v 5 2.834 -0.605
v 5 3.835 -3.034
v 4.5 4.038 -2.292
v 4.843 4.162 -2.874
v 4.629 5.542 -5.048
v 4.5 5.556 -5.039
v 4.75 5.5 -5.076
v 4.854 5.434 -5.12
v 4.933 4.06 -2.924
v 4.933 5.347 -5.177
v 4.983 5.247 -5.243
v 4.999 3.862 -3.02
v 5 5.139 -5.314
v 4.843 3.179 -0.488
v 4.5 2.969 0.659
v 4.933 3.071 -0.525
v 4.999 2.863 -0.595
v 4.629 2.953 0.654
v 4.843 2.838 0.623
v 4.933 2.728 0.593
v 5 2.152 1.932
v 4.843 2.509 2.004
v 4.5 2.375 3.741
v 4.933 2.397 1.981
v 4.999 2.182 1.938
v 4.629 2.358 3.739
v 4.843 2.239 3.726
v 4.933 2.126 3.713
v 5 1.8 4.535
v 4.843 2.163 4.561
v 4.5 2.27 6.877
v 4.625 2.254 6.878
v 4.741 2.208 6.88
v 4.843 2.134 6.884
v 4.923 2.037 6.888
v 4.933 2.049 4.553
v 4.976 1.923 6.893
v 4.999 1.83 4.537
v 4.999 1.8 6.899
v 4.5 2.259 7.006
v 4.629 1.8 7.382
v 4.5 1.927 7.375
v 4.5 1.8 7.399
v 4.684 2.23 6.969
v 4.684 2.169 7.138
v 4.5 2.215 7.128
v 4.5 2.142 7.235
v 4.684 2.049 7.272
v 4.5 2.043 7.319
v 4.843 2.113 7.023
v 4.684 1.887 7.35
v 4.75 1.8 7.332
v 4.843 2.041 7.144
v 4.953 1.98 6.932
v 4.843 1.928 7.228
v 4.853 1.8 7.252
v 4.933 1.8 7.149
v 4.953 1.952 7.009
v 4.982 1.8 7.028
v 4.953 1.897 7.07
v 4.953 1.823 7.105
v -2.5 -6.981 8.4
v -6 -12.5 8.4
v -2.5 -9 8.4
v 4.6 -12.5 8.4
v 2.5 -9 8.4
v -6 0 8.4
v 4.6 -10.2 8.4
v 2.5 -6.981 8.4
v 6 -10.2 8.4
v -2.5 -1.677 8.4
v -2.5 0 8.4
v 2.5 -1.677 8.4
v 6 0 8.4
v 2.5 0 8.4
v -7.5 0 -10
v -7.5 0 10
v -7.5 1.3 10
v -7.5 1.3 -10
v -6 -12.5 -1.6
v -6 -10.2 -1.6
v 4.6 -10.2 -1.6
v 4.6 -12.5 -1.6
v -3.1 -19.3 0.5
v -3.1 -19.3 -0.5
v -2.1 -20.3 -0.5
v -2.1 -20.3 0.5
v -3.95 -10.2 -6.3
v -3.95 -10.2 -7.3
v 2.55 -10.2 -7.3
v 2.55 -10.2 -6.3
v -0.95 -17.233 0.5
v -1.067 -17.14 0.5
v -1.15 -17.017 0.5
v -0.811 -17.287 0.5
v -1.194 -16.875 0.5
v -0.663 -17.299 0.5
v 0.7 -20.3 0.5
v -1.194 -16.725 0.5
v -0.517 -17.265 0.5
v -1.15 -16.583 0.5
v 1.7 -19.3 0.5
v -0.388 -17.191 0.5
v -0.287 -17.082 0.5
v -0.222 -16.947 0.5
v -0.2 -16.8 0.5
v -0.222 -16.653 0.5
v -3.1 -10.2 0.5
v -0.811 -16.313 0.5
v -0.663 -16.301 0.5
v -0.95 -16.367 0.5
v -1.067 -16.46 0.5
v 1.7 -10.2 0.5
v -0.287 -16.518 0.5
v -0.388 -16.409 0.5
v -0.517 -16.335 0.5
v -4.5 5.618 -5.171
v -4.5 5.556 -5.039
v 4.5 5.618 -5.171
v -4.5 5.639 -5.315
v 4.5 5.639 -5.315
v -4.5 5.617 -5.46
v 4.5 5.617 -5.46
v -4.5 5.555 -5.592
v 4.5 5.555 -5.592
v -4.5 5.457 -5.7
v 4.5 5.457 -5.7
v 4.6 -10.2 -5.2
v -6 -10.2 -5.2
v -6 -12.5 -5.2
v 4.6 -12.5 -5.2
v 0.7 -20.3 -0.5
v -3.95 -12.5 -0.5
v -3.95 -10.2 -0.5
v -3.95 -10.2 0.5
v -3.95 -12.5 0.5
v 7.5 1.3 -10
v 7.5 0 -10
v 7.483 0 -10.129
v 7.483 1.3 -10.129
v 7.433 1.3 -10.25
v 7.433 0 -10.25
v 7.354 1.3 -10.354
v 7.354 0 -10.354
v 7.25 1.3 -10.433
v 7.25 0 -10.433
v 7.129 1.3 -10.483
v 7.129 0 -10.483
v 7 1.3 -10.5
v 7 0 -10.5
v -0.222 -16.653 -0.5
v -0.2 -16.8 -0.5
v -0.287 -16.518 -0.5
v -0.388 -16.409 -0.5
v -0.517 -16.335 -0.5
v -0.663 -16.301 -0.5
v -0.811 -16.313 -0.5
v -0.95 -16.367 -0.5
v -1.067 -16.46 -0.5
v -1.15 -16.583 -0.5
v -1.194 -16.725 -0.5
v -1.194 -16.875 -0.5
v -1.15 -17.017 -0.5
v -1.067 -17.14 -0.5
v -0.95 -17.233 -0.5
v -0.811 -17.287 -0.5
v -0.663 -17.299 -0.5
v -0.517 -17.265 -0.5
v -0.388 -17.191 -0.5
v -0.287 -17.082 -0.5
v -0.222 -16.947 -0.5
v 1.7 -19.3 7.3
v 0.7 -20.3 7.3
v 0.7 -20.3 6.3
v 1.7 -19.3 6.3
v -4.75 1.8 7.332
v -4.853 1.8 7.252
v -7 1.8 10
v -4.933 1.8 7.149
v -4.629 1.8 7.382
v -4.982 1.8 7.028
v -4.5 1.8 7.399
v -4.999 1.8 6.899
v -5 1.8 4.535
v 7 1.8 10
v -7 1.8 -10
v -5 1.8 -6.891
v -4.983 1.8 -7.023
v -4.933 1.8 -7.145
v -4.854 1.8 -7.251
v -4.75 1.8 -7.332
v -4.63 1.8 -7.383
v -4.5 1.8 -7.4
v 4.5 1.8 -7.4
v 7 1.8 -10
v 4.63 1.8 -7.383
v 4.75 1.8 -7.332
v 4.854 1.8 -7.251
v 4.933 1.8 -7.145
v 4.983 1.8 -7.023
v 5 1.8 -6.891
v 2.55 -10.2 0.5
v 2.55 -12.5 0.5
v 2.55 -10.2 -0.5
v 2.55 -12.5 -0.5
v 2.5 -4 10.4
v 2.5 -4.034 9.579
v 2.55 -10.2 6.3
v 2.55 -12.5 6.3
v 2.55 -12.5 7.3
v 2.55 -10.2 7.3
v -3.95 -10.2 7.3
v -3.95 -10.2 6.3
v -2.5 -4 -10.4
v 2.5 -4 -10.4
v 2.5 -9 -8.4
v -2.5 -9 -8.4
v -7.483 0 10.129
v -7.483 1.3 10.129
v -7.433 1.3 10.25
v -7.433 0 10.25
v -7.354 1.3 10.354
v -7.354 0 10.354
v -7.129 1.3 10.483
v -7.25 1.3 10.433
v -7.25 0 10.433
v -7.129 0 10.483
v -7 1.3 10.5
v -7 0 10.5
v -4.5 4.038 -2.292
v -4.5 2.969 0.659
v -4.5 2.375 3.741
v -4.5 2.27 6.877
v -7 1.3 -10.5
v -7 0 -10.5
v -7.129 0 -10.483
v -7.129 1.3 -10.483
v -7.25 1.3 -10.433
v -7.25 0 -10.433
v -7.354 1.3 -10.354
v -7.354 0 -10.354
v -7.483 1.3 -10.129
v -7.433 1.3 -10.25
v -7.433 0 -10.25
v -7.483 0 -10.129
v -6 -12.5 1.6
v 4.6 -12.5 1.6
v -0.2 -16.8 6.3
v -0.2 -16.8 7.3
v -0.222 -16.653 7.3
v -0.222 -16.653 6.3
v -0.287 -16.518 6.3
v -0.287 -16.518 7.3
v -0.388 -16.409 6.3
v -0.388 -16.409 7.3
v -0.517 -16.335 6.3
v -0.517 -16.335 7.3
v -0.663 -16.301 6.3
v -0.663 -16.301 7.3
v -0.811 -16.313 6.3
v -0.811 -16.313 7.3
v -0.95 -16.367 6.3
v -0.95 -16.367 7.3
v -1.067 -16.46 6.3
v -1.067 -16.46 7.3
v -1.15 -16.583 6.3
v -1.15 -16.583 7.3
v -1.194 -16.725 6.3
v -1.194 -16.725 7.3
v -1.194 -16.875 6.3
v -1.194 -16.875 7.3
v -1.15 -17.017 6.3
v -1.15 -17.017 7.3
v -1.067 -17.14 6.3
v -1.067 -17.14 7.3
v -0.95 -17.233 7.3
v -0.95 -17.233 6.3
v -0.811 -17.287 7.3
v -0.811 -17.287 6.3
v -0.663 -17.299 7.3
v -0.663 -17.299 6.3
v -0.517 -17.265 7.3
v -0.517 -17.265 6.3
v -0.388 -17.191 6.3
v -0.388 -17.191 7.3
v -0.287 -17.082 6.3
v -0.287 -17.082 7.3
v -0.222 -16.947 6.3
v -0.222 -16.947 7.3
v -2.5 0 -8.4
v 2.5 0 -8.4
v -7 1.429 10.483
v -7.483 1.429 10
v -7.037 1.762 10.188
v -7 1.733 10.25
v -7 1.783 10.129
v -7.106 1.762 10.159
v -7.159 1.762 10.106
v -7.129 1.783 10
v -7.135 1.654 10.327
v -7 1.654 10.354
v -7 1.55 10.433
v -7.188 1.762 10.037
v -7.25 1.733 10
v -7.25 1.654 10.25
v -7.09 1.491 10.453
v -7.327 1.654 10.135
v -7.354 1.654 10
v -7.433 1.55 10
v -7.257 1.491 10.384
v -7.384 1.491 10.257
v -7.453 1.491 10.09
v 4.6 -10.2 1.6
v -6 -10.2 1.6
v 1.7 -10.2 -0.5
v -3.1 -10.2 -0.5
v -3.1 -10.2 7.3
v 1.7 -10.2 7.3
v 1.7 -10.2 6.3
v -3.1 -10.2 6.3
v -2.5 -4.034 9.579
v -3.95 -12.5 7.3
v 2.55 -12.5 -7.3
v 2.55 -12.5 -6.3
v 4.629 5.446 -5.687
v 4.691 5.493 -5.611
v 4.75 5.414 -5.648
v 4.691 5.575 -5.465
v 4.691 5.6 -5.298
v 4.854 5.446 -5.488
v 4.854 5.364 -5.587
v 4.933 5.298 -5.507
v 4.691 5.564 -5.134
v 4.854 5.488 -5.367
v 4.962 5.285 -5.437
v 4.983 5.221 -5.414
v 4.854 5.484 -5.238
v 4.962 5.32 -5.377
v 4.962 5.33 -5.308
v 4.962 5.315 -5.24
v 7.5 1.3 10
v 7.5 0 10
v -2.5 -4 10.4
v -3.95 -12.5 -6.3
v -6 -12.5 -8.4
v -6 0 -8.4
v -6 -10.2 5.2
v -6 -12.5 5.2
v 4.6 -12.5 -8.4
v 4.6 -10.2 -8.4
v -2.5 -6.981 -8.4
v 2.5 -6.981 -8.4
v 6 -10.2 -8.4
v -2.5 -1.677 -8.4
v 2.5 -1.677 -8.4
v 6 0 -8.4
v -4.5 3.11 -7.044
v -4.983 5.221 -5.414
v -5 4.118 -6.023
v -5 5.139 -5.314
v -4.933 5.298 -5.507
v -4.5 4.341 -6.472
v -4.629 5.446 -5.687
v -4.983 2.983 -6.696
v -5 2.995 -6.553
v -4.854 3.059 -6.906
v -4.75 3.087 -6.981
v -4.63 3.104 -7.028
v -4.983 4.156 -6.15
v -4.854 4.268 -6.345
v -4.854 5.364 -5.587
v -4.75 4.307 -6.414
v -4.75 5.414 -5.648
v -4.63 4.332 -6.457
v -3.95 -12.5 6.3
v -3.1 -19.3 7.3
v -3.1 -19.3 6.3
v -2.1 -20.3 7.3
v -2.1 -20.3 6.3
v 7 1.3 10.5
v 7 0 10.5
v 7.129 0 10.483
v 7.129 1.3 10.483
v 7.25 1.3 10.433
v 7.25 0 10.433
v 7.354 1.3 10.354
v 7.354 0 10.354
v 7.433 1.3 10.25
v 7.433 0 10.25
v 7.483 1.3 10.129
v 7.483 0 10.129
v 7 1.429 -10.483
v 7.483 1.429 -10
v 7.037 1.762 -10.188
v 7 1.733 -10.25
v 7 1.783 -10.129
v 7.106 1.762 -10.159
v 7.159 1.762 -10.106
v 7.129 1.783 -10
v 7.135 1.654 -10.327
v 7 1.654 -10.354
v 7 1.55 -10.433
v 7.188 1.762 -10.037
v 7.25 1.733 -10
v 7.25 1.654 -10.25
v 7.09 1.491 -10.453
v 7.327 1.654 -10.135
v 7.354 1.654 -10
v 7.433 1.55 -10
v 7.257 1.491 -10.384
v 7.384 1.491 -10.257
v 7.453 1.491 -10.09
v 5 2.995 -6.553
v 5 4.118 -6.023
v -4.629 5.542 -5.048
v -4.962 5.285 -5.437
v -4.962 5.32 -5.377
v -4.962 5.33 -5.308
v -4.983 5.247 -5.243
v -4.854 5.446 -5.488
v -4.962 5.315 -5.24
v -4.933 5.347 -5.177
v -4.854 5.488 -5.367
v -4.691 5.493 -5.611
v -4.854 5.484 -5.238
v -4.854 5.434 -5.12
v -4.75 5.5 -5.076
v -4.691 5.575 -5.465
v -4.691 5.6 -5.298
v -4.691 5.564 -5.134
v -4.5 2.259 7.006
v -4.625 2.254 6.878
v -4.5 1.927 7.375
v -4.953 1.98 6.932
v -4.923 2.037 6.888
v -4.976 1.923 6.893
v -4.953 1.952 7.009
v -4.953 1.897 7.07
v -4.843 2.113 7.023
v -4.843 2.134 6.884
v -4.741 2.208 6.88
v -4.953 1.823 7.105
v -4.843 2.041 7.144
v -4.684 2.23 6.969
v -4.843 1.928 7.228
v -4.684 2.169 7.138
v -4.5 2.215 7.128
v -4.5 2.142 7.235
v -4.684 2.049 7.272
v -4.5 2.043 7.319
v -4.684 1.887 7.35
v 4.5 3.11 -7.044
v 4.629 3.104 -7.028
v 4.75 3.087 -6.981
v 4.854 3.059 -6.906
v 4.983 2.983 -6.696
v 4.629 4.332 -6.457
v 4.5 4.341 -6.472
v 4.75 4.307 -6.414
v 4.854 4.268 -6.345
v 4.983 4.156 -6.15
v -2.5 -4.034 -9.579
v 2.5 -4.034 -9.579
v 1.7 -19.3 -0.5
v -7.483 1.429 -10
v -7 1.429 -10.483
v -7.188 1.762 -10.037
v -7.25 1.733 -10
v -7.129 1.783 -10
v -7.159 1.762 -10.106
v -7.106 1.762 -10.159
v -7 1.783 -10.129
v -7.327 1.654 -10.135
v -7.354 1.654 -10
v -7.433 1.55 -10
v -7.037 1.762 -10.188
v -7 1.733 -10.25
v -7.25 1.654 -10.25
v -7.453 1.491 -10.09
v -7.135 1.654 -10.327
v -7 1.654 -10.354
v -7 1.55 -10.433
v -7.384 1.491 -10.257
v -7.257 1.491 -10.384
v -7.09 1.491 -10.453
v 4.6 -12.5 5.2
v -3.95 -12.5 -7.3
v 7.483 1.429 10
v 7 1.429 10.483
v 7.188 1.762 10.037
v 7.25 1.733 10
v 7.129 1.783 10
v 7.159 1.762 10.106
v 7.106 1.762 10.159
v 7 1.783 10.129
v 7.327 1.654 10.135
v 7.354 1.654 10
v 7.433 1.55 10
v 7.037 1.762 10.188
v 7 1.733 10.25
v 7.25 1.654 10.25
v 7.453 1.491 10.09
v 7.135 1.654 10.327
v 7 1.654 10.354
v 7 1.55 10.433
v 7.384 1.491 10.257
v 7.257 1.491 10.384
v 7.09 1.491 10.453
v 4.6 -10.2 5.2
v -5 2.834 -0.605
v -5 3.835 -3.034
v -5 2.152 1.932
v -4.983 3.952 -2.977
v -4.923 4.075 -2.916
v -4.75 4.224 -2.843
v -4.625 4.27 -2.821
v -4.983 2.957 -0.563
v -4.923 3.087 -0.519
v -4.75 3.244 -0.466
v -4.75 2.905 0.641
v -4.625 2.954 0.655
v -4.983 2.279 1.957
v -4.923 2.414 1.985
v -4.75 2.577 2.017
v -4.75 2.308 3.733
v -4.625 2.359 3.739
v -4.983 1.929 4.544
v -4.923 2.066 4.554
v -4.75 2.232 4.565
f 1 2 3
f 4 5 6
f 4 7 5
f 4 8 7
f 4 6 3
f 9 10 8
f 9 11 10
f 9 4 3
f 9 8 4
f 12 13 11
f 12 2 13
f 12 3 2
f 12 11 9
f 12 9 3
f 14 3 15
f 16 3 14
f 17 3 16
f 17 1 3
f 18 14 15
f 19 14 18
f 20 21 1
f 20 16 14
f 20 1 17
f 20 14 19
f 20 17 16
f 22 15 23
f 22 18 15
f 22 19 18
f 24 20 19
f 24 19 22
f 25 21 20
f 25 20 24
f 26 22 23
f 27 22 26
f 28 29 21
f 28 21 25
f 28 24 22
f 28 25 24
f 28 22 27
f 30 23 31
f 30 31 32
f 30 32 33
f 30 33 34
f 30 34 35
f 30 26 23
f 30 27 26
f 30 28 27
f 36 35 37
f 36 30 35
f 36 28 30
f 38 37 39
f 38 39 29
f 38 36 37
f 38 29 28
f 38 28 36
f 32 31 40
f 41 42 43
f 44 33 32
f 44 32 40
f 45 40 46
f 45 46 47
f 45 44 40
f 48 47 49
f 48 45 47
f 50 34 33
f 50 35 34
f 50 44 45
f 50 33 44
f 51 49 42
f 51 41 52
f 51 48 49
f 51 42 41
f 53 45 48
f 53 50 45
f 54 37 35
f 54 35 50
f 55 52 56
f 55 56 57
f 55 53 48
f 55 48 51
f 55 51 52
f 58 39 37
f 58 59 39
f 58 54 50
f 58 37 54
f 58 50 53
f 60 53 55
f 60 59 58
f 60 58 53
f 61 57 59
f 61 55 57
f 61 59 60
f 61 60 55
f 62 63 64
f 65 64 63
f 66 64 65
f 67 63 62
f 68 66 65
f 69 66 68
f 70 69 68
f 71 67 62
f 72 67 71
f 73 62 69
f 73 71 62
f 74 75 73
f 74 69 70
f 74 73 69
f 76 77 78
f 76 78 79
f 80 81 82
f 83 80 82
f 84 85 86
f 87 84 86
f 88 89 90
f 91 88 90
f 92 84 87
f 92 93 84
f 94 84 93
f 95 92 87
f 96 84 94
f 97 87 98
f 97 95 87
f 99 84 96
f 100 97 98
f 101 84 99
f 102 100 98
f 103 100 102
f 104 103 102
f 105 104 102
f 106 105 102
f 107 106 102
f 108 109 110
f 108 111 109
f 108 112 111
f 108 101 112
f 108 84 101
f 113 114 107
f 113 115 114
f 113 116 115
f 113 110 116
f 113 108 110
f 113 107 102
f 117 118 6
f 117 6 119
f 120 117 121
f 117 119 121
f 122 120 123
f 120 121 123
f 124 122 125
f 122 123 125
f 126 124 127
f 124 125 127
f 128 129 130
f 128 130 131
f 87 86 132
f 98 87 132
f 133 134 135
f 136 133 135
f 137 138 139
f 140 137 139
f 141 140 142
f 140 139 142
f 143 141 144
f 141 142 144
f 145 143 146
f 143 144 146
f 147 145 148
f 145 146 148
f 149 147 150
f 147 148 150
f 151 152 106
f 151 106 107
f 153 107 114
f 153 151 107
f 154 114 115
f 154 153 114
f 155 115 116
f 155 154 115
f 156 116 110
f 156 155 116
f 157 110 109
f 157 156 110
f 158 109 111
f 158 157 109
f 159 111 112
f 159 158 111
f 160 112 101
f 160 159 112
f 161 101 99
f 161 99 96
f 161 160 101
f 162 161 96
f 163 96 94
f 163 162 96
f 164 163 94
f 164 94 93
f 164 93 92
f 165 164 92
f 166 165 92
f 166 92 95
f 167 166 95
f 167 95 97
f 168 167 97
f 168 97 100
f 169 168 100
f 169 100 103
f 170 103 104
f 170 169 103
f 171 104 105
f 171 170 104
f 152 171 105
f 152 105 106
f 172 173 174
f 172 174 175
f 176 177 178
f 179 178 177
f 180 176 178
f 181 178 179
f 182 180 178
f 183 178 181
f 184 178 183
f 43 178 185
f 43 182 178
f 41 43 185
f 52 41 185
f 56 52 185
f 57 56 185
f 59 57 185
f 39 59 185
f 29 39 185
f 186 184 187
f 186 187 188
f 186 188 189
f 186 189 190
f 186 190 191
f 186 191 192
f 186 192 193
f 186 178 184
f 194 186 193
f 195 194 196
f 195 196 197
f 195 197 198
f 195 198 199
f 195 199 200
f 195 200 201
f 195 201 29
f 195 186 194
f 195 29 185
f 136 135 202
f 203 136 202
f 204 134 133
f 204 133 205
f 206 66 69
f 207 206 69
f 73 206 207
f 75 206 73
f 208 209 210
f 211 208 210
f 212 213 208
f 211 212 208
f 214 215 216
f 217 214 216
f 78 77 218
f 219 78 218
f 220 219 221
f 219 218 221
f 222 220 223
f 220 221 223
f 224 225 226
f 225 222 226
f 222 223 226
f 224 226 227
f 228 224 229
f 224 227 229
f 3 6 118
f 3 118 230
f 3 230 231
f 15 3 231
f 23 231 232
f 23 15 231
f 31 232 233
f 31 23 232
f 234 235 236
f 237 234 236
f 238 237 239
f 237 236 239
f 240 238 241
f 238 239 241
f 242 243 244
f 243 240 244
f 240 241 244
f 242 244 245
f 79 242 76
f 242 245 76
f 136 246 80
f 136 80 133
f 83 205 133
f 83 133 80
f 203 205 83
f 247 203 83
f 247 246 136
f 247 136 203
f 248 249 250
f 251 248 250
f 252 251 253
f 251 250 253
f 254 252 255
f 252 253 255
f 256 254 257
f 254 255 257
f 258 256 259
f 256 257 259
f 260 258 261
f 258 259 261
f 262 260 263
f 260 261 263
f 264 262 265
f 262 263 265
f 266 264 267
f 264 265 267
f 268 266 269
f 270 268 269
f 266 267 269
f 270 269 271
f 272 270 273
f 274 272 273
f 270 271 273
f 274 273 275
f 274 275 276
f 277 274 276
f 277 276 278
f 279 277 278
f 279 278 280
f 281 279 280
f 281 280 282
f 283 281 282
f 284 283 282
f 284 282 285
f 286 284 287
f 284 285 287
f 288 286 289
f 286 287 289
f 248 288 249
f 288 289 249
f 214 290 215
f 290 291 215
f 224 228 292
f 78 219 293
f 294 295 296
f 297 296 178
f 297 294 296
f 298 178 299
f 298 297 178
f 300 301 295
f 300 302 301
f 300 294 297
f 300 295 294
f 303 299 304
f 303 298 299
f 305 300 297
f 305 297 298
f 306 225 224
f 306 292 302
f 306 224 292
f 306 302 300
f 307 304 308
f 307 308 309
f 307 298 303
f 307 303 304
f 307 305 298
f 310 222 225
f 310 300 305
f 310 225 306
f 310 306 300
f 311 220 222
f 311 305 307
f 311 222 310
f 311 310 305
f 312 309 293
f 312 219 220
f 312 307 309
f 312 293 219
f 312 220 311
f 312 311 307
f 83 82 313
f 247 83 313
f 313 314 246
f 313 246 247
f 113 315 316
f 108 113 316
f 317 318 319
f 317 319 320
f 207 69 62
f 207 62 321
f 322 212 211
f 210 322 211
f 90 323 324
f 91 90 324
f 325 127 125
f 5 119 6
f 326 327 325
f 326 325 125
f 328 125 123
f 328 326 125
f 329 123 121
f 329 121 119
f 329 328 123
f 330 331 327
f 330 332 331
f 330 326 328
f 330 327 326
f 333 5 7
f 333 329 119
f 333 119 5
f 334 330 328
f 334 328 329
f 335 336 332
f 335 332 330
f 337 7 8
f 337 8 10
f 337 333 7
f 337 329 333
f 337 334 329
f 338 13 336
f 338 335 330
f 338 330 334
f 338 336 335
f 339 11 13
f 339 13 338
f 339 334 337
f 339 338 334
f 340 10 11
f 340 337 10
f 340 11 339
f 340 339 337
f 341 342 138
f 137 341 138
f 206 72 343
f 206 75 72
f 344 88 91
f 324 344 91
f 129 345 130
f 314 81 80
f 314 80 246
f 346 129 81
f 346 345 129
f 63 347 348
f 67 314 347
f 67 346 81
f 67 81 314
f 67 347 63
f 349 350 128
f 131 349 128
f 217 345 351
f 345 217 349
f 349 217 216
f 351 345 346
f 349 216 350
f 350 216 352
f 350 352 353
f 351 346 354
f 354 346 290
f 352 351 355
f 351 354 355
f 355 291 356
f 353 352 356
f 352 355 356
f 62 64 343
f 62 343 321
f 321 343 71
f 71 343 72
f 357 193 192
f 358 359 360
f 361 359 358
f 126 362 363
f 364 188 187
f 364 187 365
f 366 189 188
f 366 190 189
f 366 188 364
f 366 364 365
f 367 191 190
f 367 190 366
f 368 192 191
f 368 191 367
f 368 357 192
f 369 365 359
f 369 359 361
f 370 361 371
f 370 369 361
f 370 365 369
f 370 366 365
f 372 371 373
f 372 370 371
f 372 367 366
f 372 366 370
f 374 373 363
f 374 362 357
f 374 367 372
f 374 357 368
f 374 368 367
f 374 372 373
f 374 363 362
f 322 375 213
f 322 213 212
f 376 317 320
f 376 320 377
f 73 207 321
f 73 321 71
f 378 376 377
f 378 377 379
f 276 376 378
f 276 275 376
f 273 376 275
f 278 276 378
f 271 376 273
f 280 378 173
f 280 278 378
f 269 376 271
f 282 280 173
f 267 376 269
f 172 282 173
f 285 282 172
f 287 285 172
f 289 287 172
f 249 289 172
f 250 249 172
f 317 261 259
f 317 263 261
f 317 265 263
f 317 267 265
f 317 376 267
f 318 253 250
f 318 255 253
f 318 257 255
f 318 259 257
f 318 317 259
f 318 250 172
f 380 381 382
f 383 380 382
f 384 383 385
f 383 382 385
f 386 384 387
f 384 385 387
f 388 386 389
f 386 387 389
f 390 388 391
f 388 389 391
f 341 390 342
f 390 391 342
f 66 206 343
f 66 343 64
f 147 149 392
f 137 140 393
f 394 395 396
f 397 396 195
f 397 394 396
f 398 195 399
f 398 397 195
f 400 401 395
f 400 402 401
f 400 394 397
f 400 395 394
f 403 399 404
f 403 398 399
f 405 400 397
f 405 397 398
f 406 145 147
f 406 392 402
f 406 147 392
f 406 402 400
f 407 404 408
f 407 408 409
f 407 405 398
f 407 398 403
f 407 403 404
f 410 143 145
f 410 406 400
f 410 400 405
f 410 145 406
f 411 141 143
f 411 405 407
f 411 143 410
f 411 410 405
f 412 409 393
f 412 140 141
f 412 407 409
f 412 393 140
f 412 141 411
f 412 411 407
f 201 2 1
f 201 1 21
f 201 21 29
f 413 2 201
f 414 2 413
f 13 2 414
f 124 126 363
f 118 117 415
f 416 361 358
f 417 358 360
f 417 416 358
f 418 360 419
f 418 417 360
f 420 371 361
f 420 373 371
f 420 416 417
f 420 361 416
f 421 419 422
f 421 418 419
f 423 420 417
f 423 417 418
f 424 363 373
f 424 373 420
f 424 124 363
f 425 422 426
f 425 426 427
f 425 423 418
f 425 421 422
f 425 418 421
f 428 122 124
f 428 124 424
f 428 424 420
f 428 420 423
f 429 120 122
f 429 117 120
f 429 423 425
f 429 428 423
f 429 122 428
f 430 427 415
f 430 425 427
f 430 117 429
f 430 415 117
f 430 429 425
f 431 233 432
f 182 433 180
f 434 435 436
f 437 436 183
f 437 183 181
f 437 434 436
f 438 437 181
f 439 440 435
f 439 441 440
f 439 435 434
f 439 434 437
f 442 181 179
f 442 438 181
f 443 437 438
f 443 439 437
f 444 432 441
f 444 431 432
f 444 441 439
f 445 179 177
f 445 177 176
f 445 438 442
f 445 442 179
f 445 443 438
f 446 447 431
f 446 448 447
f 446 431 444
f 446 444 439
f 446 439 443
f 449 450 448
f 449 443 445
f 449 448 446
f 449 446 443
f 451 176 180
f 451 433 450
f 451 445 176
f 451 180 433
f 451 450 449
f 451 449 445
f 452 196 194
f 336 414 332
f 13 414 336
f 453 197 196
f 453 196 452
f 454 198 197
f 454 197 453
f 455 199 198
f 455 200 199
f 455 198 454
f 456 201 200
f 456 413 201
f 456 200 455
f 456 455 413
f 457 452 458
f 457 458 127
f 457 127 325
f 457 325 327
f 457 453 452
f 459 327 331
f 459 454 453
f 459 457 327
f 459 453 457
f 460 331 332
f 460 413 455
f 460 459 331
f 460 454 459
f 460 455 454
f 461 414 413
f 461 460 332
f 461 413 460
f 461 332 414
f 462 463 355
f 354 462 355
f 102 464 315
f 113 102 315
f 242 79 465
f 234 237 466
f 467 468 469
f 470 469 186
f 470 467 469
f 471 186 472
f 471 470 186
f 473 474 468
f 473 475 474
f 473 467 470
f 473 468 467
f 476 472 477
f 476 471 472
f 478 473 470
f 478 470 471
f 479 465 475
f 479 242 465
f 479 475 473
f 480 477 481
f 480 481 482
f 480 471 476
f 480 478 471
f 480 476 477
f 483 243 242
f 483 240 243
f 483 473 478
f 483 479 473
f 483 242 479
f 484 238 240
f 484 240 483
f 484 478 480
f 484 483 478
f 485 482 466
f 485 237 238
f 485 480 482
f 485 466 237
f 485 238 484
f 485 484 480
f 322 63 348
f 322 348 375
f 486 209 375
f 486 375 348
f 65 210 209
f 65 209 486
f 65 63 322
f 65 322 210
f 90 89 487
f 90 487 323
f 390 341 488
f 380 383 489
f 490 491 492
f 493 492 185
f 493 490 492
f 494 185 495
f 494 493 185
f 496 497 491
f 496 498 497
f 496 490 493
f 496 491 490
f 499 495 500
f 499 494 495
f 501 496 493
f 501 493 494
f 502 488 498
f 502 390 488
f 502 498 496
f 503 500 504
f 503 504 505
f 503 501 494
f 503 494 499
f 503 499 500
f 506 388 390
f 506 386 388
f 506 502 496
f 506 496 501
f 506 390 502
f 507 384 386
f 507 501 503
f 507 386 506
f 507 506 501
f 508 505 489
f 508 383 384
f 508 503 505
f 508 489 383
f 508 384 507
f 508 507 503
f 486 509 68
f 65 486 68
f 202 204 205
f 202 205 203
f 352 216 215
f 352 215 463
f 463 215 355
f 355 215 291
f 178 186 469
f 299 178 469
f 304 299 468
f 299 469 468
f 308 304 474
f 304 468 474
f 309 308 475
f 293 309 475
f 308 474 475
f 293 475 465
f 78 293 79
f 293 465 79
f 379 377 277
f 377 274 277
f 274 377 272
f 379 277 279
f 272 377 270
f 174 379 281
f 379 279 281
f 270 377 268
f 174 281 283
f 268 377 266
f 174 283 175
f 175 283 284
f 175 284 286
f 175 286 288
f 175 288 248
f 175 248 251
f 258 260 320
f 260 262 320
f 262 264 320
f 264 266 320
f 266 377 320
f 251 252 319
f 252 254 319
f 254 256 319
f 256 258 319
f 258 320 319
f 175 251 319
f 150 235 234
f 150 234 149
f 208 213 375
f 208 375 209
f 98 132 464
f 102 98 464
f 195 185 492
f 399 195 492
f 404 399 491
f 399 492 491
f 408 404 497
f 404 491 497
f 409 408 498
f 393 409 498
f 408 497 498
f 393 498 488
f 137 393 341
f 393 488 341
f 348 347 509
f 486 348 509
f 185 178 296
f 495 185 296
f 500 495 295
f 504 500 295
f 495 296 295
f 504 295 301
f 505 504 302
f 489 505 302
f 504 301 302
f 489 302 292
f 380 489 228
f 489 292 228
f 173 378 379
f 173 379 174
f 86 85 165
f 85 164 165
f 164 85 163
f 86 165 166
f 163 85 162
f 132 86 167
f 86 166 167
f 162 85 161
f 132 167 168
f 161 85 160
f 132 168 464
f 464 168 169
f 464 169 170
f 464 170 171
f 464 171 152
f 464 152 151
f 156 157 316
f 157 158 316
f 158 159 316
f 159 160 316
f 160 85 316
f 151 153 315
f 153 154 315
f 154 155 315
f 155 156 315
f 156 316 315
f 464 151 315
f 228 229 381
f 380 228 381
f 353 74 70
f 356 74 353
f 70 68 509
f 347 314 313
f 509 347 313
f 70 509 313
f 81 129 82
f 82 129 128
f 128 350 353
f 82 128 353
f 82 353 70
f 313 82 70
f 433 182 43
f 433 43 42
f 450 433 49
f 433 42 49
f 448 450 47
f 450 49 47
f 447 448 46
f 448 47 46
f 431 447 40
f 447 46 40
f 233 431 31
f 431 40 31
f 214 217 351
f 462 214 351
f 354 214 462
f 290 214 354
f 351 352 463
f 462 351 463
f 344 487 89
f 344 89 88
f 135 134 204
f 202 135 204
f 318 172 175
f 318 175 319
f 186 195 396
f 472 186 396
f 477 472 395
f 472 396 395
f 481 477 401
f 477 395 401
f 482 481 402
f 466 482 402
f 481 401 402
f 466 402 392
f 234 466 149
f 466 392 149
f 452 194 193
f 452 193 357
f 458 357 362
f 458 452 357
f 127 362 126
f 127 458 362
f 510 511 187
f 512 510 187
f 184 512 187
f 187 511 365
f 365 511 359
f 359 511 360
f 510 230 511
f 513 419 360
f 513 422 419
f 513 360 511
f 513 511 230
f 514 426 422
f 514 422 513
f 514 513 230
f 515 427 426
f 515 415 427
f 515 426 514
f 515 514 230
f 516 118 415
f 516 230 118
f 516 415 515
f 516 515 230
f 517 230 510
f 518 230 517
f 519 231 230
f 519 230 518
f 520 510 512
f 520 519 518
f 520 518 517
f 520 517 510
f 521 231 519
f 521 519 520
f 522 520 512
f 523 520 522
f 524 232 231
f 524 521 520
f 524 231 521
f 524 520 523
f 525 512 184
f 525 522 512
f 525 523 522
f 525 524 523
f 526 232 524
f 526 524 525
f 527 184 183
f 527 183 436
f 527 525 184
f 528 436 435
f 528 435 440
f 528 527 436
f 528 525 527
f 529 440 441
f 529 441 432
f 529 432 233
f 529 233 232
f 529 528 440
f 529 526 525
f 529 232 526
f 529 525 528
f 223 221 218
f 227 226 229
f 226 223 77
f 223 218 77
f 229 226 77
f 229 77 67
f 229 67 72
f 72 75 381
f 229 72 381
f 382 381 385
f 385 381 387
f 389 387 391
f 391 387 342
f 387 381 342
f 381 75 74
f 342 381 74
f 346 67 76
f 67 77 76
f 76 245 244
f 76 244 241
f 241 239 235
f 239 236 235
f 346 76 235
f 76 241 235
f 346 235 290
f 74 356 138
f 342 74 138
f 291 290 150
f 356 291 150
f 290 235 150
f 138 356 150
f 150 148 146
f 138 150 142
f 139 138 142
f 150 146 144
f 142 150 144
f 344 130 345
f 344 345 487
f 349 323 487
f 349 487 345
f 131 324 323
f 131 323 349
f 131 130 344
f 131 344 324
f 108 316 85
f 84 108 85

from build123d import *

# Parameters (mm, degrees)
SKETCH1_W           = 15
SKETCH1_H           = 21
BOSS_EXTRUDE1_DEPTH = 1.8
SKETCH2_W           = 12
SKETCH2_H           = 16.8
BOSS_EXTRUDE2_DEPTH = 10.2
SKETCH3_W           = 10.6
SKETCH3_H           = 3.2
SKETCH3_W_2         = 6.5
SKETCH3_H_2         = 1
BOSS_EXTRUDE3_DEPTH = 2.3
SKETCH4_R           = 0.5
BOSS_EXTRUDE4_DEPTH = 1
EXTRUDE_THIN1_DEPTH = 2.5
BOSS_EXTRUDE5_DEPTH = 5
FILLET1_R           = 0.5
FILLET2_R           = 0.5


with BuildPart() as part:
    # Sketch1 → Boss-Extrude1 (new body)
    with BuildSketch(Plane(origin=(0, 0, 0), x_dir=(1, 0, 0), z_dir=(0, 1, 0))):
        Rectangle(SKETCH1_W, SKETCH1_H)
    extrude(amount=BOSS_EXTRUDE1_DEPTH)

    # Sketch2 → Boss-Extrude2 (add)
    with BuildSketch(Plane(origin=(0, 0, 0), x_dir=(1, 0, 0), z_dir=(0, 1, 0))):
        Rectangle(SKETCH2_W, SKETCH2_H)
    extrude(amount=-BOSS_EXTRUDE2_DEPTH)

    # Sketch3 → Boss-Extrude3 (add)
    # profile 1 of 3: a face of its own
    with BuildSketch(Plane.XZ.offset(10.2)):
        with Locations((-0.7, 6.8)):
            Rectangle(SKETCH3_W, SKETCH3_H)
        with Locations((-0.7, 6.8)):
            Rectangle(SKETCH3_W_2, SKETCH3_H_2, mode=Mode.SUBTRACT)
    # profile 2 of 3: a face of its own
    with BuildSketch(Plane.XZ.offset(10.2)):
        with Locations((-0.7, -6.8)):
            Rectangle(SKETCH3_W, SKETCH3_H)
        with Locations((-0.7, -6.8)):
            Rectangle(SKETCH3_W_2, SKETCH3_H_2, mode=Mode.SUBTRACT)
    # profile 3 of 3: a face of its own
    with BuildSketch(Plane.XZ.offset(10.2)):
        with Locations((-0.7, 0)):
            Rectangle(SKETCH3_W, SKETCH3_H)
        with Locations((-0.7, 0)):
            Rectangle(SKETCH3_W_2, SKETCH3_H_2, mode=Mode.SUBTRACT)
    extrude(amount=BOSS_EXTRUDE3_DEPTH)

    # Sketch5 → Extrude-Thin1 (add, symmetric)
    with BuildSketch(Plane(origin=(0, 0, 0), x_dir=(0, 0, -1), z_dir=(1, 0, 0))):
        Polygon((-8.4, 0), (-10.4, -4), (-8.4, -9), (-7.703642482, -8.721456993), (-9.57855827, -4.034167523), (-7.729179607, -0.335410197), align=None)
    extrude_thin1 = extrude(amount=EXTRUDE_THIN1_DEPTH, both=True)

    # Mirror2: Extrude-Thin1 across plane
    add(extrude_thin1.mirror(Plane.XY))

    # Sketch6 → Boss-Extrude5 (add, symmetric)
    with BuildSketch(Plane(origin=(0, 0, 0), x_dir=(0, 0, -1), z_dir=(1, 0, 0))):
        with BuildLine():
            Line((-7.4, 2.3), (-7.4, 1.8))
            Line((-7.4, 1.8), (7.4, 1.8))
            ThreePointArc((7.4, 1.8), (6.685191913, 3.942595957), (5.4, 5.8))
            ThreePointArc((5.4, 5.8), (-0.701262123, 2.957472908), (-7.4, 2.3))
        make_face()
    extrude(amount=BOSS_EXTRUDE5_DEPTH, both=True)

    # Fillet1
    # the kernel refuses this fillet: 0.5 mm, written as the material it takes off along each edge
    with BuildSketch(Plane(origin=(6.139155456, 5.8, -5.4), x_dir=(0, -0.7528288222325751, -0.658216350766155), z_dir=(-1, 0, 0))) as fillet1_piece_1:
        with BuildLine():
            CenterArc((0.441422739, 0.499797197), FILLET1_R, 187.744574116, 83.887366527)
            ThreePointArc((-0.054016593, 0.43241865), (-0.025830517, 0.21635645), (0, 0))
            ThreePointArc((0, 0), (0.227831091, -0.003244846), (0.455662182, 0))
        make_face()
    extrude(amount=12.278310911, mode=Mode.SUBTRACT)
    with BuildSketch(Plane(origin=(7.5, -1.25, -10.5), x_dir=(0, 0, 1), z_dir=(0, 1, 0)), Plane(origin=(7.5, -1.25, 10.5), x_dir=(-1, 0, 0), z_dir=(0, 1, 0))) as fillet1_piece_2:
        with BuildLine():
            CenterArc((FILLET1_R, -FILLET1_R), FILLET1_R, 90, 90)
            Line((0, -FILLET1_R), (0, 0))
            Line((0, 0), (FILLET1_R, 0))
        make_face()
    extrude(amount=4.3, mode=Mode.SUBTRACT)
    with BuildSketch(Plane(origin=(-7.5, -1.25, 10.5), x_dir=(1, 0, 0), z_dir=(0, 1, 0)), Plane(origin=(-7.5, -1.25, -10.5), x_dir=(0, 0, 1), z_dir=(0, 1, 0))) as fillet1_piece_3:
        with BuildLine():
            CenterArc((FILLET1_R, FILLET1_R), FILLET1_R, 180, 90)
            Line((0, FILLET1_R), (0, 0))
            Line((0, 0), (FILLET1_R, 0))
        make_face()
    extrude(amount=4.3, mode=Mode.SUBTRACT)
    with BuildSketch(Plane(origin=(6.324787276, 2.3, 7.4), x_dir=(0, -1, 0), z_dir=(-1, 0, 0))) as fillet1_piece_4_section:
        with BuildLine():
            CenterArc((0.529914911, -0.5), FILLET1_R, 90, 92.582364675)
            ThreePointArc((0.030422668, -0.522527754), (0.016920767, -0.26116435), (0, 0))
            Line((0, 0), (0.529914911, 0))
        make_face()
    fillet1_piece_4 = extrude(amount=12.649574553, mode=Mode.PRIVATE)
    fillet1_piece_4 = split(fillet1_piece_4, bisect_by=Plane(origin=(0, 1.8, 7.280360026), z_dir=(0, 1, 0)), keep=Keep.TOP, mode=Mode.PRIVATE)
    add(fillet1_piece_4, mode=Mode.SUBTRACT)

    # Fillet2
    # the kernel refuses this fillet: 0.5 mm, written as the material it takes off along each edge
    with BuildSketch(Plane(origin=(-5, 0.364887193, 0.470225615), x_dir=(0, 0.024106503791178756, -0.999709396012144), z_dir=(0, -0.999709396012144, -0.024106503791178756))) as fillet2_piece_1_section:
        with BuildLine():
            CenterArc((8 - FILLET2_R, FILLET2_R), FILLET2_R, 270, 90)
            Line((8 - FILLET2_R, 0), (8, 0))
            Line((8, 0), (8, FILLET2_R))
        make_face()
    fillet2_piece_1 = revolve(axis=Axis((-5, 0.364887193, 0.470225615), (1, 0, 0)), revolution_arc=38.150707639, mode=Mode.PRIVATE)
    fillet2_piece_1 = split(fillet2_piece_1, bisect_by=Plane(origin=(-4.858036818, 1.8, -6.655446505), z_dir=(0, 1, 0)), keep=Keep.TOP, mode=Mode.PRIVATE)
    add(fillet2_piece_1, mode=Mode.SUBTRACT)
    with BuildSketch(Plane(origin=(5, 0.364887193, 0.470225615), x_dir=(0, 0.024106503791178756, -0.999709396012144), z_dir=(0, -0.999709396012144, -0.024106503791178756))) as fillet2_piece_2_section:
        with BuildLine():
            CenterArc((8 - FILLET2_R, -FILLET2_R), FILLET2_R, 0, 90)
            Line((8, -FILLET2_R), (8, 0))
            Line((8, 0), (8 - FILLET2_R, 0))
        make_face()
    fillet2_piece_2 = revolve(axis=Axis((5, 0.364887193, 0.470225615), (1, 0, 0)), revolution_arc=38.150707639, mode=Mode.PRIVATE)
    fillet2_piece_2 = split(fillet2_piece_2, bisect_by=Plane(origin=(4.858036818, 1.8, -6.655446505), z_dir=(0, 1, 0)), keep=Keep.TOP, mode=Mode.PRIVATE)
    add(fillet2_piece_2, mode=Mode.SUBTRACT)
    with BuildSketch(Plane(origin=(-5, 22.249267031, 5.976362079), x_dir=(0, -0.8346613404304445, -0.5507635125812654), z_dir=(0, 0.5507635125812654, -0.8346613404304445))) as fillet2_piece_3_section:
        with BuildLine():
            CenterArc((20 + FILLET2_R, -FILLET2_R), FILLET2_R, 90, 90)
            Line((20, -FILLET2_R), (20, 0))
            Line((20, 0), (20 + FILLET2_R, 0))
        make_face()
    fillet2_piece_3 = revolve(axis=Axis((-5, 22.249267031, 5.976362079), (-1, 0, 0)), revolution_arc=36.001773577, mode=Mode.PRIVATE)
    fillet2_piece_3 = split(fillet2_piece_3, bisect_by=Plane(origin=(-4.860130529, 1.8, 0.621819924), z_dir=(0, 1, 0)), keep=Keep.TOP, mode=Mode.PRIVATE)
    add(fillet2_piece_3, mode=Mode.SUBTRACT)
    with BuildSketch(Plane(origin=(-5, 5.138709552, -5.314289929), x_dir=(0, 0.6365096479350569, -0.7712687392119495), z_dir=(0, -0.7712687392119495, -0.6365096479350569))) as fillet2_piece_4:
        with BuildLine():
            CenterArc((0.5 - FILLET2_R, FILLET2_R), FILLET2_R, 270, 90)
            Line((0.5, FILLET2_R), (0.5, 0))
            Line((0.5, 0), (0.5 - FILLET2_R, 0))
        make_face()
    revolve(axis=Axis((-5, 5.138709552, -5.314289929), (1, 0, 0)), revolution_arc=83.887366527, mode=Mode.SUBTRACT)
    with BuildSketch(Plane(origin=(-5, 1.770085089, 6.9), x_dir=(0, 0.998984484948098, -0.04505550835340167), z_dir=(0, -0.04505550835340167, -0.998984484948098))) as fillet2_piece_5_section:
        with BuildLine():
            CenterArc((0.5 - FILLET2_R, FILLET2_R), FILLET2_R, 270, 90)
            Line((0.5, FILLET2_R), (0.5, 0))
            Line((0.5, 0), (0.5 - FILLET2_R, 0))
        make_face()
    fillet2_piece_5 = revolve(axis=Axis((-5, 1.770085089, 6.9), (1, 0, 0)), revolution_arc=232.448230123, mode=Mode.PRIVATE)
    fillet2_piece_5 = split(fillet2_piece_5, bisect_by=Plane(origin=(-4.868015463, 1.8, 7.151178775), z_dir=(0, 1, 0)), keep=Keep.TOP, mode=Mode.PRIVATE)
    add(fillet2_piece_5, mode=Mode.SUBTRACT)
    with BuildSketch(Plane(origin=(5, 22.249267031, 5.976362079), x_dir=(0, -0.8346613404304445, -0.5507635125812654), z_dir=(0, 0.5507635125812654, -0.8346613404304445))) as fillet2_piece_6_section:
        with BuildLine():
            CenterArc((20 + FILLET2_R, FILLET2_R), FILLET2_R, 180, 90)
            Line((20, FILLET2_R), (20, 0))
            Line((20, 0), (20 + FILLET2_R, 0))
        make_face()
    fillet2_piece_6 = revolve(axis=Axis((5, 22.249267031, 5.976362079), (-1, 0, 0)), revolution_arc=36.001773577, mode=Mode.PRIVATE)
    fillet2_piece_6 = split(fillet2_piece_6, bisect_by=Plane(origin=(4.860130529, 1.8, 0.621819924), z_dir=(0, 1, 0)), keep=Keep.TOP, mode=Mode.PRIVATE)
    add(fillet2_piece_6, mode=Mode.SUBTRACT)
    with BuildSketch(Plane(origin=(5, 5.138709552, -5.314289929), x_dir=(0, 0.6365096479350569, -0.7712687392119495), z_dir=(0, -0.7712687392119495, -0.6365096479350569))) as fillet2_piece_7:
        with BuildLine():
            CenterArc((0.5 - FILLET2_R, -FILLET2_R), FILLET2_R, 0, 90)
            Line((0.5, -FILLET2_R), (0.5, 0))
            Line((0.5, 0), (0.5 - FILLET2_R, 0))
        make_face()
    revolve(axis=Axis((5, 5.138709552, -5.314289929), (1, 0, 0)), revolution_arc=83.887366527, mode=Mode.SUBTRACT)
    with BuildSketch(Plane(origin=(5, 1.770085089, 6.9), x_dir=(0, 0.998984484948098, -0.04505550835340167), z_dir=(0, -0.04505550835340167, -0.998984484948098))) as fillet2_piece_8_section:
        with BuildLine():
            CenterArc((0.5 - FILLET2_R, -FILLET2_R), FILLET2_R, 0, 90)
            Line((0.5, -FILLET2_R), (0.5, 0))
            Line((0.5, 0), (0.5 - FILLET2_R, 0))
        make_face()
    fillet2_piece_8 = revolve(axis=Axis((5, 1.770085089, 6.9), (1, 0, 0)), revolution_arc=232.448230123, mode=Mode.PRIVATE)
    fillet2_piece_8 = split(fillet2_piece_8, bisect_by=Plane(origin=(4.868015462, 1.8, 7.151178777), z_dir=(0, 1, 0)), keep=Keep.TOP, mode=Mode.PRIVATE)
    add(fillet2_piece_8, mode=Mode.SUBTRACT)
    with BuildSketch(Plane(origin=(7, 1.8, -10.5), x_dir=(0, 0, 1), z_dir=(-1, 0, 0))) as fillet2_piece_9:
        with BuildLine():
            CenterArc((FILLET2_R, -FILLET2_R), FILLET2_R, 90, 90)
            Line((0, -FILLET2_R), (0, 0))
            Line((0, 0), (FILLET2_R, 0))
        make_face()
    extrude(amount=14, mode=Mode.SUBTRACT)
    with BuildSketch(Plane(origin=(7.5, 1.8, 10), x_dir=(-1, 0, 0), z_dir=(0, 0, -1)), Plane(origin=(-7.5, 1.8, -10), x_dir=(1, 0, 0), z_dir=(0, 0, 1))) as fillet2_piece_10:
        with BuildLine():
            CenterArc((FILLET2_R, -FILLET2_R), FILLET2_R, 90, 90)
            Line((0, -FILLET2_R), (0, 0))
            Line((0, 0), (FILLET2_R, 0))
        make_face()
    extrude(amount=20, mode=Mode.SUBTRACT)
    with BuildSketch(Plane(origin=(-7, 1.8, 10.5), x_dir=(0, -1, 0), z_dir=(1, 0, 0))) as fillet2_piece_11:
        with BuildLine():
            CenterArc((FILLET2_R, FILLET2_R), FILLET2_R, 180, 90)
            Line((0, FILLET2_R), (0, 0))
            Line((0, 0), (FILLET2_R, 0))
        make_face()
    extrude(amount=14, mode=Mode.SUBTRACT)
    with BuildSketch(Plane(origin=(-7, 1.8, -10), x_dir=(-1, 0, 0), z_dir=(0, 0, 1))) as fillet2_piece_12:
        with BuildLine():
            CenterArc((0.5 - FILLET2_R, FILLET2_R), FILLET2_R, 270, 90)
            Line((0.5, FILLET2_R), (0.5, 0))
            Line((0.5, 0), (0.5 - FILLET2_R, 0))
        make_face()
    revolve(axis=Axis((-7, 1.8, -10), (0, -1, 0)), revolution_arc=90, mode=Mode.SUBTRACT)
    with BuildSketch(Plane(origin=(-7, 1.8, 10), x_dir=(0, 0, 1), z_dir=(1, 0, 0))) as fillet2_piece_13:
        with BuildLine():
            CenterArc((0.5 - FILLET2_R, FILLET2_R), FILLET2_R, 270, 90)
            Line((0.5, FILLET2_R), (0.5, 0))
            Line((0.5, 0), (0.5 - FILLET2_R, 0))
        make_face()
    revolve(axis=Axis((-7, 1.8, 10), (0, -1, 0)), revolution_arc=90, mode=Mode.SUBTRACT)
    with BuildSketch(Plane(origin=(7, 1.8, 10), x_dir=(1, 0, 0), z_dir=(0, 0, -1))) as fillet2_piece_14:
        with BuildLine():
            CenterArc((0.5 - FILLET2_R, FILLET2_R), FILLET2_R, 270, 90)
            Line((0.5 - FILLET2_R, 0), (0.5, 0))
            Line((0.5, 0), (0.5, FILLET2_R))
        make_face()
    revolve(axis=Axis((7, 1.8, 10), (0, -1, 0)), revolution_arc=90, mode=Mode.SUBTRACT)
    with BuildSketch(Plane(origin=(7, 1.8, -10), x_dir=(0, 0, -1), z_dir=(-1, 0, 0))) as fillet2_piece_15:
        with BuildLine():
            CenterArc((0.5 - FILLET2_R, FILLET2_R), FILLET2_R, 270, 90)
            Line((0.5, FILLET2_R), (0.5, 0))
            Line((0.5, 0), (0.5 - FILLET2_R, 0))
        make_face()
    revolve(axis=Axis((7, 1.8, -10), (0, -1, 0)), revolution_arc=90, mode=Mode.SUBTRACT)


with BuildPart() as body_2:
    # Sketch4 → Boss-Extrude4 (new body)
    with BuildSketch(Plane.XY.offset(-0.5)):
        Polygon((1.7, -10.2), (-3.1, -10.2), (-3.1, -19.3), (-2.1, -20.3), (0.7, -20.3), (1.7, -19.3), align=None)
        with Locations((-0.7, -16.8)):
            Circle(SKETCH4_R, mode=Mode.SUBTRACT)
    extrude(amount=BOSS_EXTRUDE4_DEPTH)


with BuildPart() as body_3:
    # Mirror1: mirrored copy
    add(body_2.part.mirror(Plane.XY.offset(3.4)))


solid = Compound([part.part, body_2.part, body_3.part])
